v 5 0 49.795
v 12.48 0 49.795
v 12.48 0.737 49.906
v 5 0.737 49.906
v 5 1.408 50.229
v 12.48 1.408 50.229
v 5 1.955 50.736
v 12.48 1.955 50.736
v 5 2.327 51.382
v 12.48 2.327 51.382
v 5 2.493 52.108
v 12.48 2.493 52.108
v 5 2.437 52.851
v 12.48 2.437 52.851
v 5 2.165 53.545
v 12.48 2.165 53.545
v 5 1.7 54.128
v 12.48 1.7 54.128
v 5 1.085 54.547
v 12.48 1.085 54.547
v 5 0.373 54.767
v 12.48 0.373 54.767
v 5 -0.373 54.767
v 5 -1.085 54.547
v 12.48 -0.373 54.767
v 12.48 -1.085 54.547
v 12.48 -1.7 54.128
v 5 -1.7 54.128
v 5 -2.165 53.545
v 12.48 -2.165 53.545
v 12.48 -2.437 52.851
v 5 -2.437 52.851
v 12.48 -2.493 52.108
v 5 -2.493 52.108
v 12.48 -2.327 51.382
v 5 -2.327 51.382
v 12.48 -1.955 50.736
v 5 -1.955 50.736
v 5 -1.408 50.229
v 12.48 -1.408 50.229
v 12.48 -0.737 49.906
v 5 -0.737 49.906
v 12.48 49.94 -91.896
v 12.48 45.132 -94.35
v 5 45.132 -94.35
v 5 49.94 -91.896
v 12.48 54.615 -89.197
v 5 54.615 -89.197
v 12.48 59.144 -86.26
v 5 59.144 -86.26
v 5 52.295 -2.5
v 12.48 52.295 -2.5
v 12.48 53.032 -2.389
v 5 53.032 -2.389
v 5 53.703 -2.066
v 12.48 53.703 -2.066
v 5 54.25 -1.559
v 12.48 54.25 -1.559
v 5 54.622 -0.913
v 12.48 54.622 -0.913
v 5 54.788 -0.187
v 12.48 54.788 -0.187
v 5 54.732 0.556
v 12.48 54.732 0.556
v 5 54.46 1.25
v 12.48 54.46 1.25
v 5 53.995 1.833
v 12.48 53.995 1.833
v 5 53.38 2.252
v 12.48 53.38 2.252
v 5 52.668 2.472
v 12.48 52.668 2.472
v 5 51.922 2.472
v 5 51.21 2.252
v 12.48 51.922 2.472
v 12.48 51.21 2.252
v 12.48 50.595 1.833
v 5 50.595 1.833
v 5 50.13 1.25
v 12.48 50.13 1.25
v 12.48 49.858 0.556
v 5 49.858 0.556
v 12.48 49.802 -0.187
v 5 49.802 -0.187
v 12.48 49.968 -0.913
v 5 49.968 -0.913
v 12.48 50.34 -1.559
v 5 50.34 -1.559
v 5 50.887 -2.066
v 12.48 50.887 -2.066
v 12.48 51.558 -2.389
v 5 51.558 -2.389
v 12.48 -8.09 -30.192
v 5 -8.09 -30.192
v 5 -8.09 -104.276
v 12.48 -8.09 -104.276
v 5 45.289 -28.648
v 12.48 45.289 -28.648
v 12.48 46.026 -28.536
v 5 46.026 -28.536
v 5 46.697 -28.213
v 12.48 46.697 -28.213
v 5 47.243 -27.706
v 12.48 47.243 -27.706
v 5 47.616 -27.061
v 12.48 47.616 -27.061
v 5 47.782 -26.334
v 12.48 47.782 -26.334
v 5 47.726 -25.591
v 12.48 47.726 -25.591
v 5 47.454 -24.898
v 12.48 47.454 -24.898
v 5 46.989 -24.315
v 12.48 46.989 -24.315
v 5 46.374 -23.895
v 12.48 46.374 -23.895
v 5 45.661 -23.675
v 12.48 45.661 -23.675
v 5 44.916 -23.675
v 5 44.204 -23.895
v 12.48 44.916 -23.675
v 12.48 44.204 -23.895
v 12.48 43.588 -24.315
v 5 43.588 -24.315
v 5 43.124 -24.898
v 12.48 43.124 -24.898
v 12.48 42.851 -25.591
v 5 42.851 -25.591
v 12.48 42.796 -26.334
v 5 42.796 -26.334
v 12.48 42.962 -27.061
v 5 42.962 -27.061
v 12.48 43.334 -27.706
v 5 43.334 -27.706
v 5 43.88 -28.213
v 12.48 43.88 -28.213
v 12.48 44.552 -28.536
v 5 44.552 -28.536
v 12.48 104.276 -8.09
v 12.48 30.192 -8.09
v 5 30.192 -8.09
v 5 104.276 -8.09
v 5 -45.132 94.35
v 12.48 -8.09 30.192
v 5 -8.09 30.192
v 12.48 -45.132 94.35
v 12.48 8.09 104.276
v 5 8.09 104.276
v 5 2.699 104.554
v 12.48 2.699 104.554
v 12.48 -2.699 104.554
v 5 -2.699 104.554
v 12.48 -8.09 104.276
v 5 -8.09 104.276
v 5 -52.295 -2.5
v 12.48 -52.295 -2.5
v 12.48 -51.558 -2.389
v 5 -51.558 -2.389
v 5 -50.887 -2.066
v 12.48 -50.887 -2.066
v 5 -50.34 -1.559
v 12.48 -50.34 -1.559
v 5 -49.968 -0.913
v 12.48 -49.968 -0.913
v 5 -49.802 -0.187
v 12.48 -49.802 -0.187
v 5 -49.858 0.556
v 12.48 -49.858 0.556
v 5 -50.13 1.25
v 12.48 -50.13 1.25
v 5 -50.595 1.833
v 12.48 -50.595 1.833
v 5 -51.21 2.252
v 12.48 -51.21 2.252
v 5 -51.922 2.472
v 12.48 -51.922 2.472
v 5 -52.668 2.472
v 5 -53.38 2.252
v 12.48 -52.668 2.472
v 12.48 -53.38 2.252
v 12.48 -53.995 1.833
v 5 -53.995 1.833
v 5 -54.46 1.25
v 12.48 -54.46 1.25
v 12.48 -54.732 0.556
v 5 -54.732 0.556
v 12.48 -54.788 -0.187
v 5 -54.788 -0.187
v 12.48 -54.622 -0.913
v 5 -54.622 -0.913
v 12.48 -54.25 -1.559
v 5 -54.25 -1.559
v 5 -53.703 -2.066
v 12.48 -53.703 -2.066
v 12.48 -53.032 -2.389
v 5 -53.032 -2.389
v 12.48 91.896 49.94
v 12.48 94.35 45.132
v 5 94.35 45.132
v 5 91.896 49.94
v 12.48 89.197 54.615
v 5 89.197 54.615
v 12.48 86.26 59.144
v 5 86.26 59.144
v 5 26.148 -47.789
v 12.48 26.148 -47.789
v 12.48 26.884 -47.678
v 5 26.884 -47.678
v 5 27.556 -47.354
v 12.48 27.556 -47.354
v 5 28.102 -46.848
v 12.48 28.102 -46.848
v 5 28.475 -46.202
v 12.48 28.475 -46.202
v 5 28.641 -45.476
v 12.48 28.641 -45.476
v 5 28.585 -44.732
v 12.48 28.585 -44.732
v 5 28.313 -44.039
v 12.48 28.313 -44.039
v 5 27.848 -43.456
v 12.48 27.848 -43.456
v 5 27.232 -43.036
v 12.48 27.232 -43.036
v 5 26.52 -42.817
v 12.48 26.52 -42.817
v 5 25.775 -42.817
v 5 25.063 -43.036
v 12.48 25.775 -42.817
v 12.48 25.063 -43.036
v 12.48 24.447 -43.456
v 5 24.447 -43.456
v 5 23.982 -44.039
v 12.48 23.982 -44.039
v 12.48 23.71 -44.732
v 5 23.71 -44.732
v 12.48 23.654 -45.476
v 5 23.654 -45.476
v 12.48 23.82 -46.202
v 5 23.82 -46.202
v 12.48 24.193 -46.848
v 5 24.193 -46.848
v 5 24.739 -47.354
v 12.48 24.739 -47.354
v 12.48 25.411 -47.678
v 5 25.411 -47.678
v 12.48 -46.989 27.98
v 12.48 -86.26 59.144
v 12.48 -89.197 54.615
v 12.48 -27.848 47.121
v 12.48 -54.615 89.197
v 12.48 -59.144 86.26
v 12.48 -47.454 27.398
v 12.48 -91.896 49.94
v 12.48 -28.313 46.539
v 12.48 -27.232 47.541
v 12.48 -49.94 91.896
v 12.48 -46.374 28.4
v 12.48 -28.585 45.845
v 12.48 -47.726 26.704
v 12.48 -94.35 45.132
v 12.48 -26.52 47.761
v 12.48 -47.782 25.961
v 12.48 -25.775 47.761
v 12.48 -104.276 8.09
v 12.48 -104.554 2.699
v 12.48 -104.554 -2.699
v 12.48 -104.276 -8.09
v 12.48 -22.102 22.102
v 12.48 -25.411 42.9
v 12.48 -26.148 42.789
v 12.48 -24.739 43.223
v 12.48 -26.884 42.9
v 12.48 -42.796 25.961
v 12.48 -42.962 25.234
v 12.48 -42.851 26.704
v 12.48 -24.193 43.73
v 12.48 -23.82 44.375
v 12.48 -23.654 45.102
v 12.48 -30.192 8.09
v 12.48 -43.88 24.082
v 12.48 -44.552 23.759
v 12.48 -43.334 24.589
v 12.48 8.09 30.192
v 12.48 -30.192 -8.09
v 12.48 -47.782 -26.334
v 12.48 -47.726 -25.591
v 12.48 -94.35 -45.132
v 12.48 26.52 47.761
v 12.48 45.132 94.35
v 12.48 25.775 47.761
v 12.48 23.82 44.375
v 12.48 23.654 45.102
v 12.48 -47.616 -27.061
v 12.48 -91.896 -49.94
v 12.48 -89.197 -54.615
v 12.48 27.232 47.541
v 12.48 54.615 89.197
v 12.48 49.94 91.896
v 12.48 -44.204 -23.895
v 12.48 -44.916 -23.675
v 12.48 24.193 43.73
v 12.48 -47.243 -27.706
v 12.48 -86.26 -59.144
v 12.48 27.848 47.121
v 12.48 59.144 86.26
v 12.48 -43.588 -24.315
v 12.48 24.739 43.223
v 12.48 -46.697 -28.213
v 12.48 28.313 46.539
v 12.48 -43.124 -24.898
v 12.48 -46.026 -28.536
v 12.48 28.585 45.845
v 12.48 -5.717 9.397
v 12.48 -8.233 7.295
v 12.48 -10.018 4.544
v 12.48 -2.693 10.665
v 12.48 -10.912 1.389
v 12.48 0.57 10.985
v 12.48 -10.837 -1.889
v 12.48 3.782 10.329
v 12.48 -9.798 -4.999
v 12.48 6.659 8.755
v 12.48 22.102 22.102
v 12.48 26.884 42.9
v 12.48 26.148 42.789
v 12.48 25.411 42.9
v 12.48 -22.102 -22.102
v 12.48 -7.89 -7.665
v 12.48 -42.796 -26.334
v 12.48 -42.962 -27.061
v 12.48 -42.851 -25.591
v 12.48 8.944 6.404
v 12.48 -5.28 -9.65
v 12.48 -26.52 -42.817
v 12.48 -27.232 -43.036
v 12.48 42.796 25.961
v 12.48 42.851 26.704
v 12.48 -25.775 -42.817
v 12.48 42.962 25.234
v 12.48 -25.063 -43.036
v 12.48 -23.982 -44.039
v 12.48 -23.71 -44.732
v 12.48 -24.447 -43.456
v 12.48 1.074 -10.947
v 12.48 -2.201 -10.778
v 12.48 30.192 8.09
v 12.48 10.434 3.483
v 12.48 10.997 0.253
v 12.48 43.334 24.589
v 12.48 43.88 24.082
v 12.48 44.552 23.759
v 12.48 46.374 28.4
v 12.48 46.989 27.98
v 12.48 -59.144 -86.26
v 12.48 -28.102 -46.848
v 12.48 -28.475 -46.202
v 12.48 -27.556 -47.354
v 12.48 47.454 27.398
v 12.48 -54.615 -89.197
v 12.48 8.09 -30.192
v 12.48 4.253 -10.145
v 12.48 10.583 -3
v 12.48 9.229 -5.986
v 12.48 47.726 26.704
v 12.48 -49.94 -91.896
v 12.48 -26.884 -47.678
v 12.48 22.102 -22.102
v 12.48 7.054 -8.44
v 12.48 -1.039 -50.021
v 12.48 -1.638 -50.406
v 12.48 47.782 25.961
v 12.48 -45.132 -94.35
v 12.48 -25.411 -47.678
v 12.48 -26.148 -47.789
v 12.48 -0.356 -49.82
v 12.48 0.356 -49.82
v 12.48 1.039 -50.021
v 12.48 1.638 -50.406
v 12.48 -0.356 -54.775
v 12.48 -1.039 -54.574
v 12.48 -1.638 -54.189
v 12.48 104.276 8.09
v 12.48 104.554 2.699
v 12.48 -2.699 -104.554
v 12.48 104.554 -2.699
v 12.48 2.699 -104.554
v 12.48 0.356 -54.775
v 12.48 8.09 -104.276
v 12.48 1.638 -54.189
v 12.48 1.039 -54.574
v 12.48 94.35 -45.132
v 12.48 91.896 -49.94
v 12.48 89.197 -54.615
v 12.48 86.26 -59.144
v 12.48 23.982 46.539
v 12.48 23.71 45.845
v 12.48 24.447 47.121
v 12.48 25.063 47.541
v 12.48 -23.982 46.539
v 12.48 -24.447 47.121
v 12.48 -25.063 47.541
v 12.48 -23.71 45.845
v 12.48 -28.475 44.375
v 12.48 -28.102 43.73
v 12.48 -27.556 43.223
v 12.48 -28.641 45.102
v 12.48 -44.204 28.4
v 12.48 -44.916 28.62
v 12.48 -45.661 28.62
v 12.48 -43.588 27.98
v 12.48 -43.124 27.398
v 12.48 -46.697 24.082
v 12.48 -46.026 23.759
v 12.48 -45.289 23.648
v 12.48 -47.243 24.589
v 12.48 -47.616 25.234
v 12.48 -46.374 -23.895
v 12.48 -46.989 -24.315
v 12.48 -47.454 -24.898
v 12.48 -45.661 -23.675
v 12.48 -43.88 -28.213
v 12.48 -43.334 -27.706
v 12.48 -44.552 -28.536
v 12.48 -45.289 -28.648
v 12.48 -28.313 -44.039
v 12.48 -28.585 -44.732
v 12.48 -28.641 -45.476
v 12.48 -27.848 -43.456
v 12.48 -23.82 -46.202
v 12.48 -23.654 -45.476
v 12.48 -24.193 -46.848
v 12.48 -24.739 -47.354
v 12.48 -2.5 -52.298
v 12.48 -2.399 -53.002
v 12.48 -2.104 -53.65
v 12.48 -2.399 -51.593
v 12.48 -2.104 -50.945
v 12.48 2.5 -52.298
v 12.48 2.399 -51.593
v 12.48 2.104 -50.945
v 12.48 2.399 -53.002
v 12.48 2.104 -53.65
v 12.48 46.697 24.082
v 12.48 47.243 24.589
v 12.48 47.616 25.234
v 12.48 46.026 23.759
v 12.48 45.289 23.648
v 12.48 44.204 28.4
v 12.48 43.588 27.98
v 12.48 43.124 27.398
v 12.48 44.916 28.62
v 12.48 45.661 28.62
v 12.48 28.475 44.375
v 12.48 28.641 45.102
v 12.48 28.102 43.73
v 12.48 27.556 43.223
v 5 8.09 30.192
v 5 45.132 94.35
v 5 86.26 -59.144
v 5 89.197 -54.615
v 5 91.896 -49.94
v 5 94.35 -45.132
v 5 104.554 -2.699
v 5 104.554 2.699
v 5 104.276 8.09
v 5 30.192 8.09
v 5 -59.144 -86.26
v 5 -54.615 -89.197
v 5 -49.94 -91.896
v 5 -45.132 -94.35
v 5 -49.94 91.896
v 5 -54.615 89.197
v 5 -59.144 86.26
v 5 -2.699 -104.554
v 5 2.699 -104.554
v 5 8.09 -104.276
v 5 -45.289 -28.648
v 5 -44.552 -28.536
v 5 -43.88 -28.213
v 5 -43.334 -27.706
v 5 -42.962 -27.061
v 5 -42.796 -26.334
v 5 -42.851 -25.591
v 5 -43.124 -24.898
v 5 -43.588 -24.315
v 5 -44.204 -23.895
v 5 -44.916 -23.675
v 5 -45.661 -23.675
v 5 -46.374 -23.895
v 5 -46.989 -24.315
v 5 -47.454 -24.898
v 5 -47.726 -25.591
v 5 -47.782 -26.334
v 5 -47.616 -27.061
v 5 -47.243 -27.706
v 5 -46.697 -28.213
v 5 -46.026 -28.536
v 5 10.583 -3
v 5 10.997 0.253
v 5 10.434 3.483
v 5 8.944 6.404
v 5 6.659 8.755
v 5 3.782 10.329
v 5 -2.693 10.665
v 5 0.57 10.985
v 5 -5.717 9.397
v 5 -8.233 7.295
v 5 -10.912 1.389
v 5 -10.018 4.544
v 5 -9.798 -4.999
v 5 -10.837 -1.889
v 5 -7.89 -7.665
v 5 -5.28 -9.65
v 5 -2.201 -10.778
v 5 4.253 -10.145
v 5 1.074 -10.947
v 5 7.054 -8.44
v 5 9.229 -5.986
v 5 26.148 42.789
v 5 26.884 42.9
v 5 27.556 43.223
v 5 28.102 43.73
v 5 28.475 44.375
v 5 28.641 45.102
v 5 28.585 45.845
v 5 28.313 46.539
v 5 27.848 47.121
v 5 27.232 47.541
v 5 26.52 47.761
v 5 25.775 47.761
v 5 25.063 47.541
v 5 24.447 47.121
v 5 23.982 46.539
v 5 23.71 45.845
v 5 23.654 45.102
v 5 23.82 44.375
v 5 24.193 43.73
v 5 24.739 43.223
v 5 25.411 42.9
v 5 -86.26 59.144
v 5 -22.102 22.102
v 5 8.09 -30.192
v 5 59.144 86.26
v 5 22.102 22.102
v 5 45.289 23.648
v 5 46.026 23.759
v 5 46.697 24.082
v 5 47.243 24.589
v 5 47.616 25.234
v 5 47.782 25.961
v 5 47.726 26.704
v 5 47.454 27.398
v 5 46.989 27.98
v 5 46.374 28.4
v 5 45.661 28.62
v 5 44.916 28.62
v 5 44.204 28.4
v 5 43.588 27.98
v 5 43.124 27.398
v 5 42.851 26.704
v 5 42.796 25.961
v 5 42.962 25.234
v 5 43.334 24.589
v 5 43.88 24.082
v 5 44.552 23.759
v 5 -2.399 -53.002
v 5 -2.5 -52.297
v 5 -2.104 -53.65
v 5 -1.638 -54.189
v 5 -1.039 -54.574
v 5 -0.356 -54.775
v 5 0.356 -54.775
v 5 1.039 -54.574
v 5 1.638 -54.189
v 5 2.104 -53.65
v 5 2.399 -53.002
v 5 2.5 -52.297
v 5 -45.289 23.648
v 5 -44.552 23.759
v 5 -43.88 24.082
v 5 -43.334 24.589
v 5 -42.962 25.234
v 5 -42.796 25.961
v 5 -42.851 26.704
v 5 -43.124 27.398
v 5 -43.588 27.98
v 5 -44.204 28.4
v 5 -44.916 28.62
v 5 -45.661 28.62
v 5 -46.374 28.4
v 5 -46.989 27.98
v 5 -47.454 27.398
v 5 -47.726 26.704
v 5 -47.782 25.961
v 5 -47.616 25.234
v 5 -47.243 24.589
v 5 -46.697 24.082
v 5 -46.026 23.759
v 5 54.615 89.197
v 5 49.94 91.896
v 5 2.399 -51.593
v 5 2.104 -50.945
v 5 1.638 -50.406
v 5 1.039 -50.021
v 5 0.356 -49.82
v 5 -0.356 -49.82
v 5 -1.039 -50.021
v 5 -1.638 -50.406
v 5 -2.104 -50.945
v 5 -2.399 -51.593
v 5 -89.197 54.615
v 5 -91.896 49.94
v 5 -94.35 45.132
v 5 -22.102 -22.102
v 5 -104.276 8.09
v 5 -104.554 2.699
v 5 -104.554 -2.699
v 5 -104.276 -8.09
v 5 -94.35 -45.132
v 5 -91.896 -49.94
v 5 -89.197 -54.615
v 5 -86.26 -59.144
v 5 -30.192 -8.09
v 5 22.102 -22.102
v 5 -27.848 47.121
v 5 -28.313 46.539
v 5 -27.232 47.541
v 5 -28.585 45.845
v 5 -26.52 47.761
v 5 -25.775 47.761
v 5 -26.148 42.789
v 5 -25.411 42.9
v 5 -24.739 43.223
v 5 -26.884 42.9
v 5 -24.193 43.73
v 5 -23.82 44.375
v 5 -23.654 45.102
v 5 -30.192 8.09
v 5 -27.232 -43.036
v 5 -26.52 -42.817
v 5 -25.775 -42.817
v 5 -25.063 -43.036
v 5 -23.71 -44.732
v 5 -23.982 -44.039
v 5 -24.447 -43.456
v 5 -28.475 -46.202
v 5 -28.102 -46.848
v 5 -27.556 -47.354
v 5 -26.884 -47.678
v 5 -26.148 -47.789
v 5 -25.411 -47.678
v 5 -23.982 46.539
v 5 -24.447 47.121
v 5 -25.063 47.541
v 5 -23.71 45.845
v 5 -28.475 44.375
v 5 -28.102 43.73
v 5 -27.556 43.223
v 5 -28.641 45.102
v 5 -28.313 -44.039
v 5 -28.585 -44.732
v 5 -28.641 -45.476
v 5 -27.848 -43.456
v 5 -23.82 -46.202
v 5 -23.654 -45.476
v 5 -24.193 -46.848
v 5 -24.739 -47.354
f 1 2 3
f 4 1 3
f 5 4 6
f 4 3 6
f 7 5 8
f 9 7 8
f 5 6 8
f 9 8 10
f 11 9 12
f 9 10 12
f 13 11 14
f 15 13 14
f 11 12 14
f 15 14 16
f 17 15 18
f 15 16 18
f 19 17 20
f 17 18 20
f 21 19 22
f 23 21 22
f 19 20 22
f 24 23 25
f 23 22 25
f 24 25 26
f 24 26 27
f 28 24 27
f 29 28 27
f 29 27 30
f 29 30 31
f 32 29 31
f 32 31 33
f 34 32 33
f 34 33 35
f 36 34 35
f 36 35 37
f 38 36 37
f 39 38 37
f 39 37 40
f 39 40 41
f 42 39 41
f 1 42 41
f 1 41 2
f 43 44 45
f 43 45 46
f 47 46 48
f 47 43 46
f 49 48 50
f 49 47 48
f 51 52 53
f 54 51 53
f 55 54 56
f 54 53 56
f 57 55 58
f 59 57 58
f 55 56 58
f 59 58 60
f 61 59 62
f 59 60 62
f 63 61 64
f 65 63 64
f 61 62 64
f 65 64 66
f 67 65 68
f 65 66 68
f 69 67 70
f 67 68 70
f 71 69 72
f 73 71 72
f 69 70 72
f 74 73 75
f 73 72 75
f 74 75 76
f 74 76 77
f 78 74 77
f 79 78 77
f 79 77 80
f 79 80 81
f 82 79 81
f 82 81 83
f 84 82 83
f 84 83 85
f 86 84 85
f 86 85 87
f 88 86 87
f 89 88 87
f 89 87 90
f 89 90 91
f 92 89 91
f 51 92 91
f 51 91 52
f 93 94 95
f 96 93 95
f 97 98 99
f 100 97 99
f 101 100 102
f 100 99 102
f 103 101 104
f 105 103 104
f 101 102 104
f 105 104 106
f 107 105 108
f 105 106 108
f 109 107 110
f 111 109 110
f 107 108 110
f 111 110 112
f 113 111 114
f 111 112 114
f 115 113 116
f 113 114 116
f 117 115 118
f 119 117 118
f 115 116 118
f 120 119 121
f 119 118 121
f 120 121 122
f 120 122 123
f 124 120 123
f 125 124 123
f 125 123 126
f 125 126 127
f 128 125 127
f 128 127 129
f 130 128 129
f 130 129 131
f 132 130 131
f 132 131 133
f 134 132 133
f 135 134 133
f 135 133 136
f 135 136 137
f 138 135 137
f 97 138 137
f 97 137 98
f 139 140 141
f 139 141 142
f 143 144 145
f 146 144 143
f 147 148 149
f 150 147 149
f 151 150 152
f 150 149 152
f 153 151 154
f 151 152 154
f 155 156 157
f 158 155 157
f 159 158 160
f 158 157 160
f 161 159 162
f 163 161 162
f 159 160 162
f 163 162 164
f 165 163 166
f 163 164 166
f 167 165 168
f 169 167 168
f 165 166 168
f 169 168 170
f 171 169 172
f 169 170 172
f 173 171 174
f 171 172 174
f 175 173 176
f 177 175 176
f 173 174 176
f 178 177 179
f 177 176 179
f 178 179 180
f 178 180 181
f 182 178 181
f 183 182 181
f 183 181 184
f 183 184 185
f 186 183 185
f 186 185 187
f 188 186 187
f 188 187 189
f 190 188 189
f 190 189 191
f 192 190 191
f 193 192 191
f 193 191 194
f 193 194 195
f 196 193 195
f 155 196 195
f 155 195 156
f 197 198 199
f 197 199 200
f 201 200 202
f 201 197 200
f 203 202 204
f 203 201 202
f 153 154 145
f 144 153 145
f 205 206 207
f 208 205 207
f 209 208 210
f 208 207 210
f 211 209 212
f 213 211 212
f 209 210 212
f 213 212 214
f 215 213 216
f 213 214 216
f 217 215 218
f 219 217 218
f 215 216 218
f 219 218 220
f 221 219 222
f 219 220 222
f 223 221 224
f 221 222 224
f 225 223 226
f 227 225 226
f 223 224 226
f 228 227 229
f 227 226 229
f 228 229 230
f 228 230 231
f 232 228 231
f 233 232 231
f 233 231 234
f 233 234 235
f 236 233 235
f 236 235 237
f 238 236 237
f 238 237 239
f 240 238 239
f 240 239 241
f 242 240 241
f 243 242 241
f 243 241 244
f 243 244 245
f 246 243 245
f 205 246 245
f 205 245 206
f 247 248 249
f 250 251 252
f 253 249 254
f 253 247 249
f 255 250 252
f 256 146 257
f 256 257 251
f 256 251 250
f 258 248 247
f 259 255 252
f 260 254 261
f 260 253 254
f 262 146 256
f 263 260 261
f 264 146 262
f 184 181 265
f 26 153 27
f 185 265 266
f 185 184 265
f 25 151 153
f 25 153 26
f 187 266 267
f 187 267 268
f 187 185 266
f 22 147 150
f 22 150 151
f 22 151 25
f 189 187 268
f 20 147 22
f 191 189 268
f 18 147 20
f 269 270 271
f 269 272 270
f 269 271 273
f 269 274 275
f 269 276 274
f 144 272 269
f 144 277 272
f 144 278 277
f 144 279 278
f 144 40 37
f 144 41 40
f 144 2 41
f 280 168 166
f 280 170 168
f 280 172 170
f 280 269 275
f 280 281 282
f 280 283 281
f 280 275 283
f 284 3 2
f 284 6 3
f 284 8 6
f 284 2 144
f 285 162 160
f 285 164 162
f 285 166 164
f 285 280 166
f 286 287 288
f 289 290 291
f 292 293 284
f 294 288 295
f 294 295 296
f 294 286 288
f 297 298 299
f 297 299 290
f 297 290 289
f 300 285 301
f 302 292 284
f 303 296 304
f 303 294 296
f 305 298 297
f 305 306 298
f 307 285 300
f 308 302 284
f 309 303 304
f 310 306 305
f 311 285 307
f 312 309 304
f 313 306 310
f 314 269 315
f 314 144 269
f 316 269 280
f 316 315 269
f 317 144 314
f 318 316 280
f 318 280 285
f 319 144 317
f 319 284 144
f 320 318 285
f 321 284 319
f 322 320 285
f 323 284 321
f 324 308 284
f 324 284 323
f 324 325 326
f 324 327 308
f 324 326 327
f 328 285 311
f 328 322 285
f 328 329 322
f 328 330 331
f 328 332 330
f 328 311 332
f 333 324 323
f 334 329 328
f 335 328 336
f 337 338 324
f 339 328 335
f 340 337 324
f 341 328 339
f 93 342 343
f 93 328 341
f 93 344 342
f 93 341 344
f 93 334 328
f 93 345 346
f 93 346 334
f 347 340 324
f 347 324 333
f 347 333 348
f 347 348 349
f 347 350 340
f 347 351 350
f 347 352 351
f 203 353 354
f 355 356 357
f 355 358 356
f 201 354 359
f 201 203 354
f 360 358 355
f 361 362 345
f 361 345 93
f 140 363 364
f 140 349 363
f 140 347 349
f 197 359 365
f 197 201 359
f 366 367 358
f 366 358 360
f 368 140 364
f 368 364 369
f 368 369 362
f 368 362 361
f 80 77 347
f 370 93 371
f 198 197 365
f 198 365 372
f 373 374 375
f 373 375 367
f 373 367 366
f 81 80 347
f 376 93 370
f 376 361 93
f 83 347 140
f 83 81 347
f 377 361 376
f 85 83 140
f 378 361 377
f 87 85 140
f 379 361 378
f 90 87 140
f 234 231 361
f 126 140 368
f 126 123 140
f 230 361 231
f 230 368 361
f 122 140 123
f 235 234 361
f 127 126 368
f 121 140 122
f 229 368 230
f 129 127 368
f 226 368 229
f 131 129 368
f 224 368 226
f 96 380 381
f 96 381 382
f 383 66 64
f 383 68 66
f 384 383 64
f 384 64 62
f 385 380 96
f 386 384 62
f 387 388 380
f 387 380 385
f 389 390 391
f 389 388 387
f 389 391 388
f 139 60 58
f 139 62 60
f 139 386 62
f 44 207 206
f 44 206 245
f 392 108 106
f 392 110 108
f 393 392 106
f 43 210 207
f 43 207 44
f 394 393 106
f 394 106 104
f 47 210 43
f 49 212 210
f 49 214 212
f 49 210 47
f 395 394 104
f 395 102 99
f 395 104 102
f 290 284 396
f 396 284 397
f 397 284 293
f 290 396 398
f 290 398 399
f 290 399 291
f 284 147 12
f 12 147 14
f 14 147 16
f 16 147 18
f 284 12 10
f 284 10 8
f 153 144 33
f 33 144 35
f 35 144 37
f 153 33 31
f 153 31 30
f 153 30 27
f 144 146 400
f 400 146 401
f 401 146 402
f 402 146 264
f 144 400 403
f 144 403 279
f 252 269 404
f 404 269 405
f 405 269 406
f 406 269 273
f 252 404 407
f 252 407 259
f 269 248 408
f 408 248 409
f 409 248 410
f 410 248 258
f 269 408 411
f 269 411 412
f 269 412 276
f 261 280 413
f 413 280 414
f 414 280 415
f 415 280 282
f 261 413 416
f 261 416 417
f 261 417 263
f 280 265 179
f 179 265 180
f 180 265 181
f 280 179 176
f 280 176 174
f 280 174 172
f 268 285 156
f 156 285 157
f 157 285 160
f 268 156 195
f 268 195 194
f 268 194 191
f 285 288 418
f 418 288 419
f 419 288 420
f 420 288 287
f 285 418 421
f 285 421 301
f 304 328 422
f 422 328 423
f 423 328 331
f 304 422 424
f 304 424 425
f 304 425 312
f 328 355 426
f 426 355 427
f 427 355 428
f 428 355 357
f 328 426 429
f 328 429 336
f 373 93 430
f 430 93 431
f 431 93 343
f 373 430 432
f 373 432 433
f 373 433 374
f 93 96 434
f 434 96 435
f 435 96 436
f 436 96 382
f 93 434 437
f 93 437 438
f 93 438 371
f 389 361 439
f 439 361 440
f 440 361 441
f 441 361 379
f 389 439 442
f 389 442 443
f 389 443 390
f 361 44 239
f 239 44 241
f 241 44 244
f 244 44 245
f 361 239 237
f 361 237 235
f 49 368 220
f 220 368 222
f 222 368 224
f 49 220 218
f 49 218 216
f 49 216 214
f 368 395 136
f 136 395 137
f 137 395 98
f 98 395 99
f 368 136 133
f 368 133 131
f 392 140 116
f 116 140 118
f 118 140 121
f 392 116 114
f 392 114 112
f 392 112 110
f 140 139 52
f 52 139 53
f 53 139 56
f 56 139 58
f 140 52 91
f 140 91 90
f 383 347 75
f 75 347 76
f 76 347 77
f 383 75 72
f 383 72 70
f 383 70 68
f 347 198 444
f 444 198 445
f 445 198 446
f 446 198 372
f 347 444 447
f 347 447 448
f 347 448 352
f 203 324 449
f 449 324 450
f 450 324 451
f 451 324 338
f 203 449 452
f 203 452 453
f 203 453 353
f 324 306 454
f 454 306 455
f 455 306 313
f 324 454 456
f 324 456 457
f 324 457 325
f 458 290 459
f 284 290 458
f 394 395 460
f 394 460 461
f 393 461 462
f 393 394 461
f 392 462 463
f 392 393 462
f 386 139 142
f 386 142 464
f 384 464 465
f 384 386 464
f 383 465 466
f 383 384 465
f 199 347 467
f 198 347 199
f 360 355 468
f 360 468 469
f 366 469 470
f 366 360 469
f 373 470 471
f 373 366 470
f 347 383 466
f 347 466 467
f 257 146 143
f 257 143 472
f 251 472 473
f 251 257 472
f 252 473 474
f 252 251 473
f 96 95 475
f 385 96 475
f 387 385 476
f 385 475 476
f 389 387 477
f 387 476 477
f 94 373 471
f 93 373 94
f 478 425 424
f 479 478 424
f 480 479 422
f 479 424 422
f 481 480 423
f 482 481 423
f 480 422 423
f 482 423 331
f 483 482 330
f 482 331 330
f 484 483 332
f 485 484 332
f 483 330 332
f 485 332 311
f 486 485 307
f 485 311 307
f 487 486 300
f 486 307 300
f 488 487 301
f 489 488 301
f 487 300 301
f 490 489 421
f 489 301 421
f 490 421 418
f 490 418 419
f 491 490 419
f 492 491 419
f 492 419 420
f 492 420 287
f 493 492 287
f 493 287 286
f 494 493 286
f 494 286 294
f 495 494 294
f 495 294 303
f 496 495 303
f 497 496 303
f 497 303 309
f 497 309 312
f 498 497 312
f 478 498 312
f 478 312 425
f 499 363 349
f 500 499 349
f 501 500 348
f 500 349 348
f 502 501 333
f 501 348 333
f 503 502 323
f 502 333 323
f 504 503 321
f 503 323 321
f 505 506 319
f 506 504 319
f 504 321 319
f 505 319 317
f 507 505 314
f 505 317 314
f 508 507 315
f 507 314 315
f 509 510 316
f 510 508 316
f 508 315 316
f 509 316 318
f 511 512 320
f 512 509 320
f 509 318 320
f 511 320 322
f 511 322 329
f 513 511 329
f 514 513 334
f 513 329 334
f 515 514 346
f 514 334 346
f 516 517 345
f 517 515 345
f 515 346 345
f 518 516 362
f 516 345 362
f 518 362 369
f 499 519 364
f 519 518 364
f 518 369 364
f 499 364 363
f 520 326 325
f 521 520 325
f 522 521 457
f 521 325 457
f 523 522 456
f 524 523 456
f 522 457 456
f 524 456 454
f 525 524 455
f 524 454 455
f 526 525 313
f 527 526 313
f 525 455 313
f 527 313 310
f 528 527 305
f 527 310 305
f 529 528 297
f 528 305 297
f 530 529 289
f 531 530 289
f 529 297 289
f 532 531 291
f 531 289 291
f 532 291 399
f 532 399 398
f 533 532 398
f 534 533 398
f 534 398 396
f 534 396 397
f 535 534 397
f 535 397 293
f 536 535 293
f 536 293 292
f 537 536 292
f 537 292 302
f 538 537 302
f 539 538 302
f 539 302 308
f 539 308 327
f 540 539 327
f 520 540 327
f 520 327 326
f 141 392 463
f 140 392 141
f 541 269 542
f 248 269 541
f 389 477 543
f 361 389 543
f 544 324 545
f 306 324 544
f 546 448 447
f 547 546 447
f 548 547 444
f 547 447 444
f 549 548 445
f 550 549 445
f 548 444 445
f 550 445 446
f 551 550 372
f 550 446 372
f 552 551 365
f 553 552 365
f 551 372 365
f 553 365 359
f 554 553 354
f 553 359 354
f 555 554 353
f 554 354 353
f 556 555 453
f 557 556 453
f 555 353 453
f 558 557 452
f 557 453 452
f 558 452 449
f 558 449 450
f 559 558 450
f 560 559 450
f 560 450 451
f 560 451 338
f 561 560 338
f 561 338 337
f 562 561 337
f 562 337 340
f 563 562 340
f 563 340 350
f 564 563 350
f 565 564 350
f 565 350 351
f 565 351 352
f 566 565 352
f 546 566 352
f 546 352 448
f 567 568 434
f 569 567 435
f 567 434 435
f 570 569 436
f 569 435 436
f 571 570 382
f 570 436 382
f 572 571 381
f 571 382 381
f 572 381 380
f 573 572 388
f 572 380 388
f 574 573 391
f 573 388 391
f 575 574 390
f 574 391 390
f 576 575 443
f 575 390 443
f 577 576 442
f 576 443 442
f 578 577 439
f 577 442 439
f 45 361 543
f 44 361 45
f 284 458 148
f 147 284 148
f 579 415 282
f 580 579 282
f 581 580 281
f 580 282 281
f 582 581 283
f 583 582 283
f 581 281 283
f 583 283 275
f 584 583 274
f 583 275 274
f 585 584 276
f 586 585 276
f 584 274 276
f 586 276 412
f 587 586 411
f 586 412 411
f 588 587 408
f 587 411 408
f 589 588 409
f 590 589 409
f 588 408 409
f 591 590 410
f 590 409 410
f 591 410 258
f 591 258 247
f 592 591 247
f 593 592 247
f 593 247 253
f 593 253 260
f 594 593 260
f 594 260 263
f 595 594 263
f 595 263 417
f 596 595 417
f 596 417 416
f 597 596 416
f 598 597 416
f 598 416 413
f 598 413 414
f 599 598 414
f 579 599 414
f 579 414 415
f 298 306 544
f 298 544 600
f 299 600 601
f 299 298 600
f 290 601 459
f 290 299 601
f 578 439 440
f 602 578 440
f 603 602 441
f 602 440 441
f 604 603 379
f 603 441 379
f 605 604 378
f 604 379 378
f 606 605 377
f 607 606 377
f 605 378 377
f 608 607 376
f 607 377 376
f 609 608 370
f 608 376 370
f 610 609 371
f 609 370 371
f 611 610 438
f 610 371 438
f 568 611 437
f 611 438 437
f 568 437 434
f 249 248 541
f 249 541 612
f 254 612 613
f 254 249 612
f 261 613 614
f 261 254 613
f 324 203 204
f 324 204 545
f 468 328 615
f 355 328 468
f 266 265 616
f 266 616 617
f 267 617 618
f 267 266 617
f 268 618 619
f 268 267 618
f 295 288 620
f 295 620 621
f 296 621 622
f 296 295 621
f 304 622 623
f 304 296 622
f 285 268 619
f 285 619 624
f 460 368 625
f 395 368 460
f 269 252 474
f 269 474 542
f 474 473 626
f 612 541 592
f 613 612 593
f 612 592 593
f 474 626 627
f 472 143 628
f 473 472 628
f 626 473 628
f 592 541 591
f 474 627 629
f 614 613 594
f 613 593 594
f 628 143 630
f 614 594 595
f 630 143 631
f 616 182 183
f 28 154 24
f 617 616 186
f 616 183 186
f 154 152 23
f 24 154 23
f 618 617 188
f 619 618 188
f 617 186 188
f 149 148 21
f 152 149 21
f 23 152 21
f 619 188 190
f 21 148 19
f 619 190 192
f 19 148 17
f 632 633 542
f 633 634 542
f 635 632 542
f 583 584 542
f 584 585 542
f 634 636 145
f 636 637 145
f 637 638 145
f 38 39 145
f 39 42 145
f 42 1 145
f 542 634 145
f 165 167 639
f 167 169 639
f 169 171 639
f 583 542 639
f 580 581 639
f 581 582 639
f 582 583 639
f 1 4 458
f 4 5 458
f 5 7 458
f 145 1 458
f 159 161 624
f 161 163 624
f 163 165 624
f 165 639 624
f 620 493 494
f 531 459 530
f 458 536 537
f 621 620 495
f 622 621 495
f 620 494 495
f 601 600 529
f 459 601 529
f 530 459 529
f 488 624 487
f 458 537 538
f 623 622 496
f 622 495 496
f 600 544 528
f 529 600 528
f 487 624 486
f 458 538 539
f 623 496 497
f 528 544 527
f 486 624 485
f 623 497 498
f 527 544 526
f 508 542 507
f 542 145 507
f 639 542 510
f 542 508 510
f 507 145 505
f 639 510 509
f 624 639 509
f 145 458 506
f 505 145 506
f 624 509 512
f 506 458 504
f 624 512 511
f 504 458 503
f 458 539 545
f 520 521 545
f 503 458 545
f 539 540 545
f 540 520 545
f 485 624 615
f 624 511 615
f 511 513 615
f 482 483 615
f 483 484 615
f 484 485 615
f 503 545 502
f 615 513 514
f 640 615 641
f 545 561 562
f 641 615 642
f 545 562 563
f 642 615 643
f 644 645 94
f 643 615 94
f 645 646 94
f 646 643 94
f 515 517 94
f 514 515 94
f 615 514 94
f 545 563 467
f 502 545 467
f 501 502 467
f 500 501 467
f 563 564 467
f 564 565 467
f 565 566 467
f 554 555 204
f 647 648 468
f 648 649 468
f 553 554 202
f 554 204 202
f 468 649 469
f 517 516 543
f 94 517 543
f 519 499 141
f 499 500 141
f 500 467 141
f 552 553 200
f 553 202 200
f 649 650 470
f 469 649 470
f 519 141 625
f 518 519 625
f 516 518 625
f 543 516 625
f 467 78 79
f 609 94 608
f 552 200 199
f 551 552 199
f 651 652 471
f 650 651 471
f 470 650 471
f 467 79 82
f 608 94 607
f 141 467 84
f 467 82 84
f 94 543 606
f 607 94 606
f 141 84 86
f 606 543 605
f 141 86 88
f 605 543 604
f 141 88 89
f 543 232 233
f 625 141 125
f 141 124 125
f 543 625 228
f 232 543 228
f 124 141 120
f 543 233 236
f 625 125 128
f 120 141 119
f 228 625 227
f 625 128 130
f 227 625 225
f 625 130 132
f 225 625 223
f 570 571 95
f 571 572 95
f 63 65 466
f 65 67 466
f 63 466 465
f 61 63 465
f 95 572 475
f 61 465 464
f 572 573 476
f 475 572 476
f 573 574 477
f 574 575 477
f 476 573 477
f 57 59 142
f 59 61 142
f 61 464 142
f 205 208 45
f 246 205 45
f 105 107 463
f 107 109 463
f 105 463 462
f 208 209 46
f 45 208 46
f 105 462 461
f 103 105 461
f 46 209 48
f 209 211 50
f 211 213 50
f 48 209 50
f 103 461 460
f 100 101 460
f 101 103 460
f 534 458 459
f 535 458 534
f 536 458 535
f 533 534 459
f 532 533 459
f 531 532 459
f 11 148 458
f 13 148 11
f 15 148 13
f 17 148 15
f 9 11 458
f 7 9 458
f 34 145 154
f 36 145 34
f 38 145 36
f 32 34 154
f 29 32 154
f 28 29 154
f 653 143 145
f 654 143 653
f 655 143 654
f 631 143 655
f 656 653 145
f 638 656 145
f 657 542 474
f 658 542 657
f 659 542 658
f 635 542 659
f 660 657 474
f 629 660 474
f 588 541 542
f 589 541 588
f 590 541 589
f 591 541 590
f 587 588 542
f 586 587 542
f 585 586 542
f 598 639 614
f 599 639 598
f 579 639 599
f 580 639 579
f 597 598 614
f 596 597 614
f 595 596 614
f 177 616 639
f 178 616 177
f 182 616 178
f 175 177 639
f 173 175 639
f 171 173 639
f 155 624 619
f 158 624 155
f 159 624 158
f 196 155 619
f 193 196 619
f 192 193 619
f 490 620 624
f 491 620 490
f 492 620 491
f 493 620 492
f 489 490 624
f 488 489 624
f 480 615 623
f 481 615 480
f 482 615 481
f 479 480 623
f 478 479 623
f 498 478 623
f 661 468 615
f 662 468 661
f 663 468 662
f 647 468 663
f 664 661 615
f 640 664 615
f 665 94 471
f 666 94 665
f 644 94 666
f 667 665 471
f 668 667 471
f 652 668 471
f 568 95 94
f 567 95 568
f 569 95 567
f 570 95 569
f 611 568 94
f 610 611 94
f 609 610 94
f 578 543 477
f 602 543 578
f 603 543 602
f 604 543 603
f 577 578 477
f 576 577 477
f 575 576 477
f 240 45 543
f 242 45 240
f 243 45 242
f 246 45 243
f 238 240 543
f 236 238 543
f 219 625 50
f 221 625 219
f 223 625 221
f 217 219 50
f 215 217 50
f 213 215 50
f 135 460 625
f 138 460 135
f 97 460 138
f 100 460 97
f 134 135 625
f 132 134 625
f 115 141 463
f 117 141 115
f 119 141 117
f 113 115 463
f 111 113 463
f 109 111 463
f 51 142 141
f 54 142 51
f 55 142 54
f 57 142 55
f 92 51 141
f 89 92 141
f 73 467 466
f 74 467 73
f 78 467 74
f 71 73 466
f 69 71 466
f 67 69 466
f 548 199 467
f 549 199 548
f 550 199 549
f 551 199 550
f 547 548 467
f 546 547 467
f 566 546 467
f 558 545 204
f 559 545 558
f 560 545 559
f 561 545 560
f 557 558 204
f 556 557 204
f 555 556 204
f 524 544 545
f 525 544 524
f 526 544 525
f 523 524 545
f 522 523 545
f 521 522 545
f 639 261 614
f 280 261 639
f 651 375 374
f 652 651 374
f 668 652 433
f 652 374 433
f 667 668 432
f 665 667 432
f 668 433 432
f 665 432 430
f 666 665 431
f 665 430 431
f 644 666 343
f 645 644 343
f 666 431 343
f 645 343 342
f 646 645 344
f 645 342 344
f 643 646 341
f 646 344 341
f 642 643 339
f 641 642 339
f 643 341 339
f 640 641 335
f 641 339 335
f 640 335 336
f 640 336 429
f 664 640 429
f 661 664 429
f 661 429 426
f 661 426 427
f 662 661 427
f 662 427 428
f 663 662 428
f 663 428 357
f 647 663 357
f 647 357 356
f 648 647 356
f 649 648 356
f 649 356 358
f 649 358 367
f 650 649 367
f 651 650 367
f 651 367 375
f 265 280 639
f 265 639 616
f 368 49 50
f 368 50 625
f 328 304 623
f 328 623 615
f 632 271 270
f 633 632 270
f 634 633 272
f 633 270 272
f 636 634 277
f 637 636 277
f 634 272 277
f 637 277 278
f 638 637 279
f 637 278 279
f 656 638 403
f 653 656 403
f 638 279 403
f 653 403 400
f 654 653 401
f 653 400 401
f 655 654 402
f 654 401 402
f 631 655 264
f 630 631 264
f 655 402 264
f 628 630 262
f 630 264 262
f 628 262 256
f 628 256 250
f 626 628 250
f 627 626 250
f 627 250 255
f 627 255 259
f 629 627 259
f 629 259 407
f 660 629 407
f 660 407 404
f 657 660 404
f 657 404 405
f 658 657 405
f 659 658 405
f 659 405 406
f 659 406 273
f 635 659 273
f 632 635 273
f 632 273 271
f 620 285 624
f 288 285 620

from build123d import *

# Parameters (mm, degrees)
SKETCH1_W           = 450
SKETCH1_H           = 450
BOSS_EXTRUDE1_DEPTH = 5
BOSS_EXTRUDE2_DEPTH = 7.48
BOSS_EXTRUDE3_DEPTH = 7.48
SKETCH6_W           = 450
SKETCH6_H           = 450
CUT_EXTRUDE1_DEPTH  = 5
SKETCH7_R           = 11
SKETCH7_R_2         = 2.5
CUT_EXTRUDE2_DEPTH  = 10
SKETCH8_R           = 209.3091
SKETCH8_R_2         = 104.5891
CUT_EXTRUDE3_DEPTH  = 10
BOSS_EXTRUDE4_DEPTH = 7.48
SKETCH11_R          = 2.5
CUT_EXTRUDE5_DEPTH  = 10
SKETCH12_R          = 20.73675099
SKETCH12_R_2        = 11
BOSS_EXTRUDE5_DEPTH = 7.48


# Read off the part's stored shape, not the designer's step: Boss-Extrude2
with BuildPart() as part:
    # Sketch1 → Boss-Extrude1 (new body)
    with BuildSketch(Plane(origin=(0, 0, 0), x_dir=(0, 0, -1), z_dir=(1, 0, 0))):
        Rectangle(SKETCH1_W, SKETCH1_H)
    extrude(amount=BOSS_EXTRUDE1_DEPTH)

    # Boss-Extrude2 outline → Boss-Extrude2 (add)
    with BuildSketch(Plane(origin=(5, 0, 0), x_dir=(0, 0, -1), z_dir=(1, 0, 0))):
        with BuildLine():
            Line((-164.971757583, 8.09), (-209.152698388, 8.09))
            ThreePointArc((-209.152698388, 8.09), (-209.3091, 0), (-209.152698388, -8.09))
            Line((-209.152698388, -8.09), (-164.971757583, -8.09))
            ThreePointArc((-164.971757583, -8.09), (-116.792827049, -116.792827049), (-8.09, -164.971757583))
            Line((-8.09, -164.971757583), (-8.09, -209.152698388))
            ThreePointArc((-8.09, -209.152698388), (0, -209.3091), (8.09, -209.152698388))
            Line((8.09, -209.152698388), (8.09, -164.971757583))
            ThreePointArc((8.09, -164.971757583), (116.792827049, -116.792827049), (164.971757583, -8.09))
            Line((164.971757583, -8.09), (209.152698388, -8.09))
            ThreePointArc((209.152698388, -8.09), (209.3091, 0), (209.152698388, 8.09))
            Line((209.152698388, 8.09), (164.971757583, 8.09))
            ThreePointArc((164.971757583, 8.09), (116.792827049, 116.792827049), (8.09, 164.971757583))
            Line((8.09, 164.971757583), (8.09, 209.152698388))
            ThreePointArc((8.09, 209.152698388), (0, 209.3091), (-8.09, 209.152698388))
            Line((-8.09, 209.152698388), (-8.09, 164.971757583))
            ThreePointArc((-8.09, 164.971757583), (-116.792827049, 116.792827049), (-164.971757583, 8.09))
        make_face()
        with BuildLine():
            Line((148.770198629, 8.09), (104.538333308, 8.09))
            ThreePointArc((104.538333308, 8.09), (104.8509, 0), (104.538333308, -8.09))
            Line((104.538333308, -8.09), (148.770198629, -8.09))
            ThreePointArc((148.770198629, -8.09), (105.351839329, -105.351839329), (8.09, -148.770198629))
            Line((8.09, -148.770198629), (8.09, -104.538333308))
            ThreePointArc((8.09, -104.538333308), (0, -104.8509), (-8.09, -104.538333308))
            Line((-8.09, -104.538333308), (-8.09, -148.770198629))
            ThreePointArc((-8.09, -148.770198629), (-105.351839329, -105.351839329), (-148.770198629, -8.09))
            Line((-148.770198629, -8.09), (-104.538333308, -8.09))
            ThreePointArc((-104.538333308, -8.09), (-104.8509, 0), (-104.538333308, 8.09))
            Line((-104.538333308, 8.09), (-148.770198629, 8.09))
            ThreePointArc((-148.770198629, 8.09), (-105.351839329, 105.351839329), (-8.09, 148.770198629))
            Line((-8.09, 148.770198629), (-8.09, 104.538333308))
            ThreePointArc((-8.09, 104.538333308), (0, 104.8509), (8.09, 104.538333308))
            Line((8.09, 104.538333308), (8.09, 148.770198629))
            ThreePointArc((8.09, 148.770198629), (105.351839329, 105.351839329), (148.770198629, 8.09))
        make_face(mode=Mode.SUBTRACT)
    extrude(amount=BOSS_EXTRUDE2_DEPTH)

    # Sketch5 → Boss-Extrude3 (add)
    with BuildSketch(Plane(origin=(5, 0, 0), x_dir=(0, 0, -1), z_dir=(1, 0, 0))):
        with BuildLine():
            Line((-19.319547743, 8.09), (-104.275748565, 8.09))
            ThreePointArc((-104.275748565, 8.09), (-104.5891, 0), (-104.275748565, -8.09))
            Line((-104.275748565, -8.09), (-19.319547743, -8.09))
            ThreePointArc((-19.319547743, -8.09), (0, -20.945), (19.319547743, -8.09))
            Line((19.319547743, -8.09), (104.275748565, -8.09))
            ThreePointArc((104.275748565, -8.09), (104.5891, 0), (104.275748565, 8.09))
            Line((104.275748565, 8.09), (19.319547743, 8.09))
            ThreePointArc((19.319547743, 8.09), (0, 20.945), (-19.319547743, 8.09))
        make_face()
    extrude(amount=BOSS_EXTRUDE3_DEPTH)

    # Sketch6 → Cut-Extrude1 (cut)
    with BuildSketch(Plane.ZY):
        Rectangle(SKETCH6_W, SKETCH6_H)
    extrude(amount=-CUT_EXTRUDE1_DEPTH, mode=Mode.SUBTRACT)


with BuildPart() as cut_extrude1_piece_1:
    # of the separate pieces the step leaves, piece 1, a body of its own (cut_extrude1_pieces)
    add(part.part.solids().sort_by_distance((5, 209.152698388, 8.09))[0])


with BuildPart() as cut_extrude1_piece_2:
    # of the separate pieces the step leaves, piece 2, a body of its own (cut_extrude1_pieces)
    add(part.part.solids().sort_by_distance((5, 8.09, -104.275748565))[0])


with BuildPart() as cut_extrude2_tool:
    # Sketch7 → Cut-Extrude2 (new body)
    with BuildSketch(Plane(origin=(12.48, 0, 0), x_dir=(0, 0, -1), z_dir=(1, 0, 0))):
        Circle(SKETCH7_R)
        with Locations((-183.1891, 0)):
            Circle(SKETCH7_R_2)
        with Locations((-130.9659, 0)):
            Circle(SKETCH7_R_2)
        with Locations((0, -183.1891)):
            Circle(SKETCH7_R_2)
        with Locations((0, -130.9659)):
            Circle(SKETCH7_R_2)
        with Locations((183.1891, 0)):
            Circle(SKETCH7_R_2)
        with Locations((52.3, 0)):
            Circle(SKETCH7_R_2)
        with Locations((-52.295, 0)):
            Circle(SKETCH7_R_2)
        with Locations((0, 183.1891)):
            Circle(SKETCH7_R_2)
        with Locations((0, 130.9659)):
            Circle(SKETCH7_R_2)
        with BuildLine():
            Line((-3, 13.8), (-3, 10.583005244))
            ThreePointArc((-3, 10.583005244), (0, 11), (3, 10.583005244))
            Line((3, 10.583005244), (3, 13.8))
            Line((3, 13.8), (-3, 13.8))
        make_face()
        with BuildLine():
            ThreePointArc((3, -10.583005244), (0, -11), (-3, -10.583005244))
            Line((-3, -10.583005244), (-3, -13.8))
            Line((-3, -13.8), (3, -13.8))
            Line((3, -13.8), (3, -10.583005244))
        make_face()
        with Locations((130.9659, 0)):
            Circle(SKETCH7_R_2)
    extrude(amount=-CUT_EXTRUDE2_DEPTH)


with BuildPart() as cut_extrude1_piece_1_1:
    add(cut_extrude1_piece_1.part)

    # Cut-Extrude2: cut by cut_extrude2_tool
    add(cut_extrude2_tool.part, mode=Mode.SUBTRACT)

    # Sketch8 → Cut-Extrude3 (cut)
    with BuildSketch(Plane(origin=(12.48, 0, 0), x_dir=(0, 0, -1), z_dir=(1, 0, 0))):
        Circle(SKETCH8_R)
        Circle(SKETCH8_R_2, mode=Mode.SUBTRACT)
    extrude(amount=-CUT_EXTRUDE3_DEPTH, mode=Mode.SUBTRACT)


with BuildPart() as cut_extrude1_piece_2_1:
    add(cut_extrude1_piece_2.part)

    # Cut-Extrude2: cut by cut_extrude2_tool
    add(cut_extrude2_tool.part, mode=Mode.SUBTRACT)

    # Sketch9 → Boss-Extrude4 (add)
    with BuildSketch(Plane(origin=(12.48, 0, 0), x_dir=(0, 0, -1), z_dir=(1, 0, 0))):
        with BuildLine():
            Line((-94.350447256, 45.131728766), (-30.192291033, 8.09))
            Line((-30.192291033, 8.09), (-19.319547743, 8.09))
            ThreePointArc((-19.319547743, 8.09), (0, 20.945), (19.319547743, 8.09))
            Line((19.319547743, 8.09), (30.192291033, 8.09))
            Line((30.192291033, 8.09), (94.350447256, 45.131728766))
            ThreePointArc((94.350447256, 45.131728766), (90.576817559, 52.29455), (86.260447256, 59.144019799))
            Line((86.260447256, 59.144019799), (22.102291033, 22.102291033))
            Line((22.102291033, 22.102291033), (59.144019799, 86.260447256))
            ThreePointArc((59.144019799, 86.260447256), (52.29455, 90.576817559), (45.131728766, 94.350447256))
            Line((45.131728766, 94.350447256), (8.09, 30.192291033))
            Line((8.09, 30.192291033), (8.09, 104.275748565))
            ThreePointArc((8.09, 104.275748565), (0, 104.5891), (-8.09, 104.275748565))
            Line((-8.09, 104.275748565), (-8.09, 30.192291033))
            Line((-8.09, 30.192291033), (-45.131728766, 94.350447256))
            ThreePointArc((-45.131728766, 94.350447256), (-52.29455, 90.576817559), (-59.144019799, 86.260447256))
            Line((-59.144019799, 86.260447256), (-22.102291033, 22.102291033))
            Line((-22.102291033, 22.102291033), (-86.260447256, 59.144019799))
            ThreePointArc((-86.260447256, 59.144019799), (-90.576817559, 52.29455), (-94.350447256, 45.131728766))
        make_face()
        with BuildLine():
            ThreePointArc((19.319547743, -8.09), (0, -20.945), (-19.319547743, -8.09))
            Line((-19.319547743, -8.09), (-30.192291033, -8.09))
            Line((-30.192291033, -8.09), (-94.350447256, -45.131728766))
            ThreePointArc((-94.350447256, -45.131728766), (-90.576817559, -52.29455), (-86.260447256, -59.144019799))
            Line((-86.260447256, -59.144019799), (-22.102291033, -22.102291033))
            Line((-22.102291033, -22.102291033), (-59.144019799, -86.260447256))
            ThreePointArc((-59.144019799, -86.260447256), (-52.29455, -90.576817559), (-45.131728766, -94.350447256))
            Line((-45.131728766, -94.350447256), (-8.09, -30.192291033))
            Line((-8.09, -30.192291033), (-8.09, -104.275748565))
            ThreePointArc((-8.09, -104.275748565), (0, -104.5891), (8.09, -104.275748565))
            Line((8.09, -104.275748565), (8.09, -30.192291033))
            Line((8.09, -30.192291033), (45.131728766, -94.350447256))
            ThreePointArc((45.131728766, -94.350447256), (52.29455, -90.576817559), (59.144019799, -86.260447256))
            Line((59.144019799, -86.260447256), (22.102291033, -22.102291033))
            Line((22.102291033, -22.102291033), (86.260447256, -59.144019799))
            ThreePointArc((86.260447256, -59.144019799), (90.576817559, -52.29455), (94.350447256, -45.131728766))
            Line((94.350447256, -45.131728766), (30.192291033, -8.09))
            Line((30.192291033, -8.09), (19.319547743, -8.09))
        make_face()
    extrude(amount=-BOSS_EXTRUDE4_DEPTH)

    # Sketch11 → Cut-Extrude5 (cut)
    with BuildSketch(Plane(origin=(12.48, 0, 0), x_dir=(0, 0, -1), z_dir=(1, 0, 0))):
        with Locations((-52.295, 0)):
            Circle(SKETCH11_R)
        with Locations((-45.288798491, 26.1475)):
            Circle(SKETCH11_R)
        with Locations((-26.1475, 45.288798491)):
            Circle(SKETCH11_R)
        with Locations((0, 52.295)):
            Circle(SKETCH11_R)
        with Locations((26.1475, 45.288798491)):
            Circle(SKETCH11_R)
        with Locations((45.288798491, 26.1475)):
            Circle(SKETCH11_R)
        with Locations((52.295, 0)):
            Circle(SKETCH11_R)
        with Locations((45.288798491, -26.1475)):
            Circle(SKETCH11_R)
        with Locations((26.1475, -45.288798491)):
            Circle(SKETCH11_R)
        with Locations((0, -52.295)):
            Circle(SKETCH11_R)
        with Locations((-26.1475, -45.288798491)):
            Circle(SKETCH11_R)
        with Locations((-45.288798491, -26.1475)):
            Circle(SKETCH11_R)
    extrude(amount=-CUT_EXTRUDE5_DEPTH, mode=Mode.SUBTRACT)

    # Sketch12 → Boss-Extrude5 (add)
    with BuildSketch(Plane(origin=(12.48, 0, 0), x_dir=(0, 0, -1), z_dir=(1, 0, 0))):
        Circle(SKETCH12_R)
        Circle(SKETCH12_R_2, mode=Mode.SUBTRACT)
    extrude(amount=-BOSS_EXTRUDE5_DEPTH)


solid = cut_extrude1_piece_2_1.part
